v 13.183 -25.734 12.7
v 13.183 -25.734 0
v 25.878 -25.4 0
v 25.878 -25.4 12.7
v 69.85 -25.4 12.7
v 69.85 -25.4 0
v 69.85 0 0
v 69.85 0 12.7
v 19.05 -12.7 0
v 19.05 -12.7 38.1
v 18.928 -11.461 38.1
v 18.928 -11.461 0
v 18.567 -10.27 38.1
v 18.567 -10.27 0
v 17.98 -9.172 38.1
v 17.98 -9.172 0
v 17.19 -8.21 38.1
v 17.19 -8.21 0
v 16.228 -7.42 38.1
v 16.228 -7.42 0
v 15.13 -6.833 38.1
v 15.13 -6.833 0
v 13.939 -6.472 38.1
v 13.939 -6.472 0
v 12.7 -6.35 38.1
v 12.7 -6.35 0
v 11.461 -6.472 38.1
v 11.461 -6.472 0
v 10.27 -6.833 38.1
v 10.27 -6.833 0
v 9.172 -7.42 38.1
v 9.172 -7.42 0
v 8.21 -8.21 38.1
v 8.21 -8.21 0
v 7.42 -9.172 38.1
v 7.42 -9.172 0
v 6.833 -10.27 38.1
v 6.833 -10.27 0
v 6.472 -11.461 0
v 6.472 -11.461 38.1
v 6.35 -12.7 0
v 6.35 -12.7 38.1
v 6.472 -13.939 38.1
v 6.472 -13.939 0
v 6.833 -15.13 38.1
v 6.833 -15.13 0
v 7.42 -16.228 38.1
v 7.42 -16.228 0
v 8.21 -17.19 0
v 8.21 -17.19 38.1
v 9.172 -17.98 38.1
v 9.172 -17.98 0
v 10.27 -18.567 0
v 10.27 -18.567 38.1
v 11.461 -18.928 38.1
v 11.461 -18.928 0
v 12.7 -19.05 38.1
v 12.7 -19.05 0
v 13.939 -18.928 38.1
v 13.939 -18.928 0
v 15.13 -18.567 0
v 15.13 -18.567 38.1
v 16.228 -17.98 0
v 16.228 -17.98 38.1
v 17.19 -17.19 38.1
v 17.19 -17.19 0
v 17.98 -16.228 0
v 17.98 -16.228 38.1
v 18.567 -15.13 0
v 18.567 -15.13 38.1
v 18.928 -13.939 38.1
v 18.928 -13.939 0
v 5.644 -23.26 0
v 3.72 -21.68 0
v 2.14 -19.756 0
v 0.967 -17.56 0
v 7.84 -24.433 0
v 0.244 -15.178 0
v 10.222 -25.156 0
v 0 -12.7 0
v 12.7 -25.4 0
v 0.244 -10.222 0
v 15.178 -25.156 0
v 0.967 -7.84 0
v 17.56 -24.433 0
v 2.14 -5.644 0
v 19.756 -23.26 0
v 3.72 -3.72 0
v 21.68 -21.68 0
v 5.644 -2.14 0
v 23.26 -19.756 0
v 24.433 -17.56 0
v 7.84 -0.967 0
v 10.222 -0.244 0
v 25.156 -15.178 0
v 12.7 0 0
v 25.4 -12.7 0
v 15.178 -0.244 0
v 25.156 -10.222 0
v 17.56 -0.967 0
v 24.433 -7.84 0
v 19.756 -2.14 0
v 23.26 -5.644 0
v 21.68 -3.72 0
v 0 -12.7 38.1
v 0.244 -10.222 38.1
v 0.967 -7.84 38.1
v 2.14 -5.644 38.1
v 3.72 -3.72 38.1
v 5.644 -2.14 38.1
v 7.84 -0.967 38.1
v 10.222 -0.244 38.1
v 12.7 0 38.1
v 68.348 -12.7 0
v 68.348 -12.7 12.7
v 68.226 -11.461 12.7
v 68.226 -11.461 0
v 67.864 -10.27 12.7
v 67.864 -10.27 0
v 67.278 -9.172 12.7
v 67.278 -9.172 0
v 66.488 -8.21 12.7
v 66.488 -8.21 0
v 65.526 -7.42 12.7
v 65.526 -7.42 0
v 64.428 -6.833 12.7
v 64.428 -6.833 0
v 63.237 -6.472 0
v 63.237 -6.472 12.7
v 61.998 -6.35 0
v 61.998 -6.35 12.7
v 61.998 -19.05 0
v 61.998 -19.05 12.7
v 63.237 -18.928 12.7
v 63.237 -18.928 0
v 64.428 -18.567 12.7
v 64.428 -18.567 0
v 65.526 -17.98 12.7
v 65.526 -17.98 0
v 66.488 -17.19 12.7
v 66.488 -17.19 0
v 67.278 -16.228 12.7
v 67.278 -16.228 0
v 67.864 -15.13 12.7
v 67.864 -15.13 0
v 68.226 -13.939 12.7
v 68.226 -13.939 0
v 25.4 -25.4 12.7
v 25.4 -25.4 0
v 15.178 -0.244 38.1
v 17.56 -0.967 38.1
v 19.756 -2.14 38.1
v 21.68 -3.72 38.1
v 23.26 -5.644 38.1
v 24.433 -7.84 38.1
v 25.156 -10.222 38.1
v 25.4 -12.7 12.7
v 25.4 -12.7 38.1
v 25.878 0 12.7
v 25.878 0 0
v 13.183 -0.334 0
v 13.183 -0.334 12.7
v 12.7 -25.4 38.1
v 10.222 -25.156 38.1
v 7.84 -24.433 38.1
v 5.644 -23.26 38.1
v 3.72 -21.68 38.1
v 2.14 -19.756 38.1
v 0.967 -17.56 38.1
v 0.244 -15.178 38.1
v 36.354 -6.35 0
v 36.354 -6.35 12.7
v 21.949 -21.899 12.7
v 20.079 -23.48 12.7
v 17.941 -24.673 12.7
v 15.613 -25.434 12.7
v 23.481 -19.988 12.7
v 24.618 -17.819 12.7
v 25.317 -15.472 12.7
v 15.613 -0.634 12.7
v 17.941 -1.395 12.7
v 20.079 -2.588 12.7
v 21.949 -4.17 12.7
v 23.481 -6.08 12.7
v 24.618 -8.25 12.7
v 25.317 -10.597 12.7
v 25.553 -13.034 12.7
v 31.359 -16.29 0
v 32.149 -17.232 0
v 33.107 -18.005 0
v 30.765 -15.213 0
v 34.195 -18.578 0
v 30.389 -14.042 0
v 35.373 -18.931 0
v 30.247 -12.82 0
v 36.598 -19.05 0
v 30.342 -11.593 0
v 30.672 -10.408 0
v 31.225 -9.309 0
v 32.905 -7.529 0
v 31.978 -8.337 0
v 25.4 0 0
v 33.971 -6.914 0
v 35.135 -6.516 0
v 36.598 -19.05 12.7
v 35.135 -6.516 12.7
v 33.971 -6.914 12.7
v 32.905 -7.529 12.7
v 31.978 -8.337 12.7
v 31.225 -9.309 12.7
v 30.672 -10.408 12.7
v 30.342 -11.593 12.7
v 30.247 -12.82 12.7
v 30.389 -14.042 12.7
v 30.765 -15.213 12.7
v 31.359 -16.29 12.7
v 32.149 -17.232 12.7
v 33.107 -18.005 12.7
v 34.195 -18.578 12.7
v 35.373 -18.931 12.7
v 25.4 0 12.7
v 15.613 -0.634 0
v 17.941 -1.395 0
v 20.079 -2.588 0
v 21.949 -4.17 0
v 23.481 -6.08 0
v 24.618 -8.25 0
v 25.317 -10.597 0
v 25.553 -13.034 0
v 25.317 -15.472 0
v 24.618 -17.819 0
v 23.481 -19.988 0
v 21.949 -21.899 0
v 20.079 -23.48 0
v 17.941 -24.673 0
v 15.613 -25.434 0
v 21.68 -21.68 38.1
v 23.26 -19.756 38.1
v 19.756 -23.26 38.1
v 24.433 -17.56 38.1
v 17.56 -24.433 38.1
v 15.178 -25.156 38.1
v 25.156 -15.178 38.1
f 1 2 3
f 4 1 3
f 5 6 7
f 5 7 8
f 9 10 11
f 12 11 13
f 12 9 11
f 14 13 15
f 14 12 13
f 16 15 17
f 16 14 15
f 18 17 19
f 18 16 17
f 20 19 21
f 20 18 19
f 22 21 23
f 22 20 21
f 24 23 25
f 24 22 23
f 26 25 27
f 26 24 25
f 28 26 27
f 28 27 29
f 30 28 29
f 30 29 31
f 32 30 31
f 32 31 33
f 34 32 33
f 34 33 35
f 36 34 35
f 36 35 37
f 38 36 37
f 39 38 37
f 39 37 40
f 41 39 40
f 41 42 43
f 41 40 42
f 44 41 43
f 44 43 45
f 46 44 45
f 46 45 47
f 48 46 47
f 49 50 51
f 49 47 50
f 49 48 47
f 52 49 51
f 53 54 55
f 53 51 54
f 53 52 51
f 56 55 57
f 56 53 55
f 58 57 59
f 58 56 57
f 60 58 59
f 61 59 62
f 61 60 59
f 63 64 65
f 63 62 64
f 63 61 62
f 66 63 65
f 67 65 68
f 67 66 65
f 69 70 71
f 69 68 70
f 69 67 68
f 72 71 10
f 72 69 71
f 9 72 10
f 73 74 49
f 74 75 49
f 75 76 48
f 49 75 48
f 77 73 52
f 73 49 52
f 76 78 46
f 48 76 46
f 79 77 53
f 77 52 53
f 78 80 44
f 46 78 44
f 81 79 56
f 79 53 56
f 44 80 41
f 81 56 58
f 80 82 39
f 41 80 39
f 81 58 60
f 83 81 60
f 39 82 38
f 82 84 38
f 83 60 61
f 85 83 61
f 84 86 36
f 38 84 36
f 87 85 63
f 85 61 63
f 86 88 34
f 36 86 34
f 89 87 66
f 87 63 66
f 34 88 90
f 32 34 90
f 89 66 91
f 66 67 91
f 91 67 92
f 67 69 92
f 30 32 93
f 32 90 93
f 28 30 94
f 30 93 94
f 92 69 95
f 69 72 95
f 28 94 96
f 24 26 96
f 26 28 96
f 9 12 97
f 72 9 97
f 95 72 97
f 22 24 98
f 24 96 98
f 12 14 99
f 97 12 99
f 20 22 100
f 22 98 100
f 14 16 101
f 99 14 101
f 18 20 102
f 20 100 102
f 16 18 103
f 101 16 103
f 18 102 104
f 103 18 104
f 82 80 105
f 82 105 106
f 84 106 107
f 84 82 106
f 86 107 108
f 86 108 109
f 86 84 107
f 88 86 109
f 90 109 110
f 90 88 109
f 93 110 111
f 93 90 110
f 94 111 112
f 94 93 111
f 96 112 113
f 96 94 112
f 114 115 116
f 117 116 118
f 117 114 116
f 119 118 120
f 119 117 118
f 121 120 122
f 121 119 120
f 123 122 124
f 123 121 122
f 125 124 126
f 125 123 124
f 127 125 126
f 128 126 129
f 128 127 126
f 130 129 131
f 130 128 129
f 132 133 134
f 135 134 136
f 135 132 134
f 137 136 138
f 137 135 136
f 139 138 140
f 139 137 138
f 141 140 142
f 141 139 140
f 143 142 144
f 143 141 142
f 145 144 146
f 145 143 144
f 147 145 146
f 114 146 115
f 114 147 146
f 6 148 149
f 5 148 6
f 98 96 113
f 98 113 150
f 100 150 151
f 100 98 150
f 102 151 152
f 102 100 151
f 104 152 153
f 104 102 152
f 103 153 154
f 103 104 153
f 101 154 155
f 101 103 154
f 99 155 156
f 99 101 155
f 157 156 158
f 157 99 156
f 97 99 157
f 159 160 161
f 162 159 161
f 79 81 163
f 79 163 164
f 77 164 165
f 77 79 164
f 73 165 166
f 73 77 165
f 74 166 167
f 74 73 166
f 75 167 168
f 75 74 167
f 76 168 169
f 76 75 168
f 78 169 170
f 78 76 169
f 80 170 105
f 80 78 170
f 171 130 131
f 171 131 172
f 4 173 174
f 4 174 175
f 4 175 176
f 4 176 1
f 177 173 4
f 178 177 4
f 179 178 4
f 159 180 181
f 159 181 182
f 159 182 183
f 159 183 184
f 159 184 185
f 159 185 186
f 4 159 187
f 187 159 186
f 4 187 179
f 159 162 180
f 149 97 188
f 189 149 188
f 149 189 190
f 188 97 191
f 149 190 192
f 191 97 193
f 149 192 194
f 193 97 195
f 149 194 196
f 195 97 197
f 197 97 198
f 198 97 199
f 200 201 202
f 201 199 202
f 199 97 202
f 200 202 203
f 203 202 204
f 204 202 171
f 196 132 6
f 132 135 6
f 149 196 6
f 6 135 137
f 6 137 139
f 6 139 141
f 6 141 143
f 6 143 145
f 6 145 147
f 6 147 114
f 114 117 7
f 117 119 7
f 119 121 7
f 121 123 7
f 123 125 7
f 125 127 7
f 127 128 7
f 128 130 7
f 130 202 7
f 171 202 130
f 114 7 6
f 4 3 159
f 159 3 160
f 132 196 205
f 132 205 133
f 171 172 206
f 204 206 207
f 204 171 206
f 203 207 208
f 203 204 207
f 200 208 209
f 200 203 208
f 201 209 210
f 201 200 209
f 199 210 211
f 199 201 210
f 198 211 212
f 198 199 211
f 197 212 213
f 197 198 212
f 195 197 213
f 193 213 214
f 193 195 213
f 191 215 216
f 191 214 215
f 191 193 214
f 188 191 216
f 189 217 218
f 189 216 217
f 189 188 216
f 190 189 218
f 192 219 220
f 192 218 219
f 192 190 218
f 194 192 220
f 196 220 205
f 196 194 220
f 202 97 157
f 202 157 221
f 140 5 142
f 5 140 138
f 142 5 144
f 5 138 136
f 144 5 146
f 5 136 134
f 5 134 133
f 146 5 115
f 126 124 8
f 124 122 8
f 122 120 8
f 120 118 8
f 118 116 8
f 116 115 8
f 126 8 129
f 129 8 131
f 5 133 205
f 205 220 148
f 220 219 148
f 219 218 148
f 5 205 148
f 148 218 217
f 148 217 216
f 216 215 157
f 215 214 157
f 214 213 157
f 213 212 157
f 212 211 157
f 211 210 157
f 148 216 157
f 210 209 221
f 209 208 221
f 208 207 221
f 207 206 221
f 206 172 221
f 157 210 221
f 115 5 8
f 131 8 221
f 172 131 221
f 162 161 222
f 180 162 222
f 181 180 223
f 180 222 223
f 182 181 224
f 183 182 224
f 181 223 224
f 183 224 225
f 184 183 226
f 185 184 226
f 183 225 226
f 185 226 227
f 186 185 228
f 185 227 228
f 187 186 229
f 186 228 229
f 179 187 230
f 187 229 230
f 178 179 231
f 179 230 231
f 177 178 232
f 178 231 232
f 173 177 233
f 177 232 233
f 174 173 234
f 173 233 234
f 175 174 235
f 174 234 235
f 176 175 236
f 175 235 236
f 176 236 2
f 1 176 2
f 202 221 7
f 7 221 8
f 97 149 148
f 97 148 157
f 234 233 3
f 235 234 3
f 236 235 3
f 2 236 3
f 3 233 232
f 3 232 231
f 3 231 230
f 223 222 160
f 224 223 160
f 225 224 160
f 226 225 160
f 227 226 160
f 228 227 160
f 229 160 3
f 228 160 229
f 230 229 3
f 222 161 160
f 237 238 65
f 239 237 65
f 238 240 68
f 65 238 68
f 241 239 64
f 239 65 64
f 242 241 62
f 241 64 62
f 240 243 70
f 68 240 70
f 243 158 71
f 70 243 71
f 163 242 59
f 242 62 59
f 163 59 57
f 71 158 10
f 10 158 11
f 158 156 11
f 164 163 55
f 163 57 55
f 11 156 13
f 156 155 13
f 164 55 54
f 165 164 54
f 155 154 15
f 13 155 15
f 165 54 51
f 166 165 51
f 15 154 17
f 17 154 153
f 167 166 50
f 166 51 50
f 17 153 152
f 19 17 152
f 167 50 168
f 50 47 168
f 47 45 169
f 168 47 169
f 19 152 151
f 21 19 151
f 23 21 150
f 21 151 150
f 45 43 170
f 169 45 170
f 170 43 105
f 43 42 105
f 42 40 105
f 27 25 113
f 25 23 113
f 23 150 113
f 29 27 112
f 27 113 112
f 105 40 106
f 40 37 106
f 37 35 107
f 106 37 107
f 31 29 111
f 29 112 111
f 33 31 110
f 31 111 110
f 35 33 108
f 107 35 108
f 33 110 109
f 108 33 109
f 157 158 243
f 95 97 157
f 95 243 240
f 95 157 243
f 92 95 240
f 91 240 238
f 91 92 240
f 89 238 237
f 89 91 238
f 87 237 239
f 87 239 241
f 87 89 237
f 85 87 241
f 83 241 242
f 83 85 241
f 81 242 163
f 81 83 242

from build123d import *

# Parameters (mm, degrees)
F1_DEPTH = 25.4
F3_DEPTH = 50.8
F4_R     = 6.35
F5_DEPTH = 50.8
F7_DEPTH = 12.7


# Not quite as in the source:
# - a feature names something its author has since deleted; it is built from what else it names


with BuildPart() as f1:
    # F0 (on Front) → F1 (new body)
    with BuildSketch(Plane.XZ):
        Polygon((0, 38.1), (0, 0), (69.85, 0), (69.85, 12.7), (25.4, 12.7), (25.4, 38.1), align=None)
    extrude(amount=F1_DEPTH)

    # F2 (on Top) → F3 (cut)
    with BuildSketch(Plane.XY):
        with BuildLine():
            ThreePointArc((42.9501019467, -12.6976528488), (41.0895425425, -17.1894405959), (36.5977547955, -19.05))
            Line((36.5977547955, -19.05), (61.9977547955, -19.05))
            ThreePointArc((61.9977547955, -19.05), (55.6477547955, -12.7), (61.9977547955, -6.35))
            Line((61.9977547955, -6.35), (36.8419220343, -6.35))
            ThreePointArc((36.8419220343, -6.35), (41.1750547307, -8.2930371297), (42.9501019467, -12.6976528488))
        make_face()
        with BuildLine():
            ThreePointArc((61.9977547955, -6.35), (55.6477547955, -12.7), (61.9977547955, -19.05))
            Line((61.9977547955, -19.05), (61.9977547955, -6.35))
        make_face()
        with BuildLine():
            Line((61.9977547955, -6.35), (61.9977547955, -19.05))
            ThreePointArc((61.9977547955, -19.05), (66.487882856, -17.1901280605), (68.3477547955, -12.7))
            ThreePointArc((68.3477547955, -12.7), (66.487882856, -8.2098719395), (61.9977547955, -6.35))
        make_face()
        with BuildLine():
            Line((36.8419220343, -6.35), (36.3535875566, -6.35))
            Line((36.3535875566, -6.35), (36.5977547955, -19.05))
            ThreePointArc((36.5977547955, -19.05), (41.0895425425, -17.1894405959), (42.9501019467, -12.6976528488))
            ThreePointArc((42.9501019467, -12.6976528488), (41.1750547307, -8.2930371297), (36.8419220343, -6.35))
        make_face()
        with BuildLine():
            Line((36.5977547955, -19.05), (36.3535875566, -6.35))
            ThreePointArc((36.3535875566, -6.35), (30.2465813283, -12.819759029), (36.5977547955, -19.05))
        make_face()
    extrude(amount=F3_DEPTH, mode=Mode.SUBTRACT)

    # F4 (on Top) → F5 (cut)
    with BuildSketch(Plane.XY):
        with BuildLine():
            Line((0, -25.4), (12.7, -25.4))
            ThreePointArc((12.7, -25.4), (3.7197438789, -21.6802561211), (0, -12.7))
            Line((0, -12.7), (0, -25.4))
        make_face()
        with BuildLine():
            Line((0, 0), (0, -12.7))
            ThreePointArc((0, -12.7), (3.7197438789, -3.7197438789), (12.7, 0))
            Line((12.7, 0), (0, 0))
        make_face()
        with BuildLine():
            ThreePointArc((12.7, 0), (21.6802561211, -3.7197438789), (25.4, -12.7))
            Line((25.4, -12.7), (25.4, 0))
            Line((25.4, 0), (12.7, 0))
        make_face()
        with BuildLine():
            ThreePointArc((25.4, -12.7), (21.6802561211, -21.6802561211), (12.7, -25.4))
            Line((12.7, -25.4), (25.4, -25.4))
            Line((25.4, -25.4), (25.4, -12.7))
        make_face()
        with Locations((12.7, -12.7)):
            Circle(F4_R)
    extrude(amount=F5_DEPTH, mode=Mode.SUBTRACT)


with BuildPart() as f7:
    # F6 (on Top) → F7 (new body)
    with BuildSketch(Plane.XY):
        with BuildLine():
            ThreePointArc((13.1827720211, -0.334095074), (25.5529580345, -13.034095074), (13.1827720211, -25.734095074))
            Line((13.1827720211, -25.734095074), (25.8783767913, -25.4))
            Line((25.8783767913, -25.4), (25.8783767913, 0))
            Line((25.8783767913, 0), (13.1827720211, -0.334095074))
        make_face()
    extrude(amount=F7_DEPTH)


solid = Compound([f1.part, f7.part])
